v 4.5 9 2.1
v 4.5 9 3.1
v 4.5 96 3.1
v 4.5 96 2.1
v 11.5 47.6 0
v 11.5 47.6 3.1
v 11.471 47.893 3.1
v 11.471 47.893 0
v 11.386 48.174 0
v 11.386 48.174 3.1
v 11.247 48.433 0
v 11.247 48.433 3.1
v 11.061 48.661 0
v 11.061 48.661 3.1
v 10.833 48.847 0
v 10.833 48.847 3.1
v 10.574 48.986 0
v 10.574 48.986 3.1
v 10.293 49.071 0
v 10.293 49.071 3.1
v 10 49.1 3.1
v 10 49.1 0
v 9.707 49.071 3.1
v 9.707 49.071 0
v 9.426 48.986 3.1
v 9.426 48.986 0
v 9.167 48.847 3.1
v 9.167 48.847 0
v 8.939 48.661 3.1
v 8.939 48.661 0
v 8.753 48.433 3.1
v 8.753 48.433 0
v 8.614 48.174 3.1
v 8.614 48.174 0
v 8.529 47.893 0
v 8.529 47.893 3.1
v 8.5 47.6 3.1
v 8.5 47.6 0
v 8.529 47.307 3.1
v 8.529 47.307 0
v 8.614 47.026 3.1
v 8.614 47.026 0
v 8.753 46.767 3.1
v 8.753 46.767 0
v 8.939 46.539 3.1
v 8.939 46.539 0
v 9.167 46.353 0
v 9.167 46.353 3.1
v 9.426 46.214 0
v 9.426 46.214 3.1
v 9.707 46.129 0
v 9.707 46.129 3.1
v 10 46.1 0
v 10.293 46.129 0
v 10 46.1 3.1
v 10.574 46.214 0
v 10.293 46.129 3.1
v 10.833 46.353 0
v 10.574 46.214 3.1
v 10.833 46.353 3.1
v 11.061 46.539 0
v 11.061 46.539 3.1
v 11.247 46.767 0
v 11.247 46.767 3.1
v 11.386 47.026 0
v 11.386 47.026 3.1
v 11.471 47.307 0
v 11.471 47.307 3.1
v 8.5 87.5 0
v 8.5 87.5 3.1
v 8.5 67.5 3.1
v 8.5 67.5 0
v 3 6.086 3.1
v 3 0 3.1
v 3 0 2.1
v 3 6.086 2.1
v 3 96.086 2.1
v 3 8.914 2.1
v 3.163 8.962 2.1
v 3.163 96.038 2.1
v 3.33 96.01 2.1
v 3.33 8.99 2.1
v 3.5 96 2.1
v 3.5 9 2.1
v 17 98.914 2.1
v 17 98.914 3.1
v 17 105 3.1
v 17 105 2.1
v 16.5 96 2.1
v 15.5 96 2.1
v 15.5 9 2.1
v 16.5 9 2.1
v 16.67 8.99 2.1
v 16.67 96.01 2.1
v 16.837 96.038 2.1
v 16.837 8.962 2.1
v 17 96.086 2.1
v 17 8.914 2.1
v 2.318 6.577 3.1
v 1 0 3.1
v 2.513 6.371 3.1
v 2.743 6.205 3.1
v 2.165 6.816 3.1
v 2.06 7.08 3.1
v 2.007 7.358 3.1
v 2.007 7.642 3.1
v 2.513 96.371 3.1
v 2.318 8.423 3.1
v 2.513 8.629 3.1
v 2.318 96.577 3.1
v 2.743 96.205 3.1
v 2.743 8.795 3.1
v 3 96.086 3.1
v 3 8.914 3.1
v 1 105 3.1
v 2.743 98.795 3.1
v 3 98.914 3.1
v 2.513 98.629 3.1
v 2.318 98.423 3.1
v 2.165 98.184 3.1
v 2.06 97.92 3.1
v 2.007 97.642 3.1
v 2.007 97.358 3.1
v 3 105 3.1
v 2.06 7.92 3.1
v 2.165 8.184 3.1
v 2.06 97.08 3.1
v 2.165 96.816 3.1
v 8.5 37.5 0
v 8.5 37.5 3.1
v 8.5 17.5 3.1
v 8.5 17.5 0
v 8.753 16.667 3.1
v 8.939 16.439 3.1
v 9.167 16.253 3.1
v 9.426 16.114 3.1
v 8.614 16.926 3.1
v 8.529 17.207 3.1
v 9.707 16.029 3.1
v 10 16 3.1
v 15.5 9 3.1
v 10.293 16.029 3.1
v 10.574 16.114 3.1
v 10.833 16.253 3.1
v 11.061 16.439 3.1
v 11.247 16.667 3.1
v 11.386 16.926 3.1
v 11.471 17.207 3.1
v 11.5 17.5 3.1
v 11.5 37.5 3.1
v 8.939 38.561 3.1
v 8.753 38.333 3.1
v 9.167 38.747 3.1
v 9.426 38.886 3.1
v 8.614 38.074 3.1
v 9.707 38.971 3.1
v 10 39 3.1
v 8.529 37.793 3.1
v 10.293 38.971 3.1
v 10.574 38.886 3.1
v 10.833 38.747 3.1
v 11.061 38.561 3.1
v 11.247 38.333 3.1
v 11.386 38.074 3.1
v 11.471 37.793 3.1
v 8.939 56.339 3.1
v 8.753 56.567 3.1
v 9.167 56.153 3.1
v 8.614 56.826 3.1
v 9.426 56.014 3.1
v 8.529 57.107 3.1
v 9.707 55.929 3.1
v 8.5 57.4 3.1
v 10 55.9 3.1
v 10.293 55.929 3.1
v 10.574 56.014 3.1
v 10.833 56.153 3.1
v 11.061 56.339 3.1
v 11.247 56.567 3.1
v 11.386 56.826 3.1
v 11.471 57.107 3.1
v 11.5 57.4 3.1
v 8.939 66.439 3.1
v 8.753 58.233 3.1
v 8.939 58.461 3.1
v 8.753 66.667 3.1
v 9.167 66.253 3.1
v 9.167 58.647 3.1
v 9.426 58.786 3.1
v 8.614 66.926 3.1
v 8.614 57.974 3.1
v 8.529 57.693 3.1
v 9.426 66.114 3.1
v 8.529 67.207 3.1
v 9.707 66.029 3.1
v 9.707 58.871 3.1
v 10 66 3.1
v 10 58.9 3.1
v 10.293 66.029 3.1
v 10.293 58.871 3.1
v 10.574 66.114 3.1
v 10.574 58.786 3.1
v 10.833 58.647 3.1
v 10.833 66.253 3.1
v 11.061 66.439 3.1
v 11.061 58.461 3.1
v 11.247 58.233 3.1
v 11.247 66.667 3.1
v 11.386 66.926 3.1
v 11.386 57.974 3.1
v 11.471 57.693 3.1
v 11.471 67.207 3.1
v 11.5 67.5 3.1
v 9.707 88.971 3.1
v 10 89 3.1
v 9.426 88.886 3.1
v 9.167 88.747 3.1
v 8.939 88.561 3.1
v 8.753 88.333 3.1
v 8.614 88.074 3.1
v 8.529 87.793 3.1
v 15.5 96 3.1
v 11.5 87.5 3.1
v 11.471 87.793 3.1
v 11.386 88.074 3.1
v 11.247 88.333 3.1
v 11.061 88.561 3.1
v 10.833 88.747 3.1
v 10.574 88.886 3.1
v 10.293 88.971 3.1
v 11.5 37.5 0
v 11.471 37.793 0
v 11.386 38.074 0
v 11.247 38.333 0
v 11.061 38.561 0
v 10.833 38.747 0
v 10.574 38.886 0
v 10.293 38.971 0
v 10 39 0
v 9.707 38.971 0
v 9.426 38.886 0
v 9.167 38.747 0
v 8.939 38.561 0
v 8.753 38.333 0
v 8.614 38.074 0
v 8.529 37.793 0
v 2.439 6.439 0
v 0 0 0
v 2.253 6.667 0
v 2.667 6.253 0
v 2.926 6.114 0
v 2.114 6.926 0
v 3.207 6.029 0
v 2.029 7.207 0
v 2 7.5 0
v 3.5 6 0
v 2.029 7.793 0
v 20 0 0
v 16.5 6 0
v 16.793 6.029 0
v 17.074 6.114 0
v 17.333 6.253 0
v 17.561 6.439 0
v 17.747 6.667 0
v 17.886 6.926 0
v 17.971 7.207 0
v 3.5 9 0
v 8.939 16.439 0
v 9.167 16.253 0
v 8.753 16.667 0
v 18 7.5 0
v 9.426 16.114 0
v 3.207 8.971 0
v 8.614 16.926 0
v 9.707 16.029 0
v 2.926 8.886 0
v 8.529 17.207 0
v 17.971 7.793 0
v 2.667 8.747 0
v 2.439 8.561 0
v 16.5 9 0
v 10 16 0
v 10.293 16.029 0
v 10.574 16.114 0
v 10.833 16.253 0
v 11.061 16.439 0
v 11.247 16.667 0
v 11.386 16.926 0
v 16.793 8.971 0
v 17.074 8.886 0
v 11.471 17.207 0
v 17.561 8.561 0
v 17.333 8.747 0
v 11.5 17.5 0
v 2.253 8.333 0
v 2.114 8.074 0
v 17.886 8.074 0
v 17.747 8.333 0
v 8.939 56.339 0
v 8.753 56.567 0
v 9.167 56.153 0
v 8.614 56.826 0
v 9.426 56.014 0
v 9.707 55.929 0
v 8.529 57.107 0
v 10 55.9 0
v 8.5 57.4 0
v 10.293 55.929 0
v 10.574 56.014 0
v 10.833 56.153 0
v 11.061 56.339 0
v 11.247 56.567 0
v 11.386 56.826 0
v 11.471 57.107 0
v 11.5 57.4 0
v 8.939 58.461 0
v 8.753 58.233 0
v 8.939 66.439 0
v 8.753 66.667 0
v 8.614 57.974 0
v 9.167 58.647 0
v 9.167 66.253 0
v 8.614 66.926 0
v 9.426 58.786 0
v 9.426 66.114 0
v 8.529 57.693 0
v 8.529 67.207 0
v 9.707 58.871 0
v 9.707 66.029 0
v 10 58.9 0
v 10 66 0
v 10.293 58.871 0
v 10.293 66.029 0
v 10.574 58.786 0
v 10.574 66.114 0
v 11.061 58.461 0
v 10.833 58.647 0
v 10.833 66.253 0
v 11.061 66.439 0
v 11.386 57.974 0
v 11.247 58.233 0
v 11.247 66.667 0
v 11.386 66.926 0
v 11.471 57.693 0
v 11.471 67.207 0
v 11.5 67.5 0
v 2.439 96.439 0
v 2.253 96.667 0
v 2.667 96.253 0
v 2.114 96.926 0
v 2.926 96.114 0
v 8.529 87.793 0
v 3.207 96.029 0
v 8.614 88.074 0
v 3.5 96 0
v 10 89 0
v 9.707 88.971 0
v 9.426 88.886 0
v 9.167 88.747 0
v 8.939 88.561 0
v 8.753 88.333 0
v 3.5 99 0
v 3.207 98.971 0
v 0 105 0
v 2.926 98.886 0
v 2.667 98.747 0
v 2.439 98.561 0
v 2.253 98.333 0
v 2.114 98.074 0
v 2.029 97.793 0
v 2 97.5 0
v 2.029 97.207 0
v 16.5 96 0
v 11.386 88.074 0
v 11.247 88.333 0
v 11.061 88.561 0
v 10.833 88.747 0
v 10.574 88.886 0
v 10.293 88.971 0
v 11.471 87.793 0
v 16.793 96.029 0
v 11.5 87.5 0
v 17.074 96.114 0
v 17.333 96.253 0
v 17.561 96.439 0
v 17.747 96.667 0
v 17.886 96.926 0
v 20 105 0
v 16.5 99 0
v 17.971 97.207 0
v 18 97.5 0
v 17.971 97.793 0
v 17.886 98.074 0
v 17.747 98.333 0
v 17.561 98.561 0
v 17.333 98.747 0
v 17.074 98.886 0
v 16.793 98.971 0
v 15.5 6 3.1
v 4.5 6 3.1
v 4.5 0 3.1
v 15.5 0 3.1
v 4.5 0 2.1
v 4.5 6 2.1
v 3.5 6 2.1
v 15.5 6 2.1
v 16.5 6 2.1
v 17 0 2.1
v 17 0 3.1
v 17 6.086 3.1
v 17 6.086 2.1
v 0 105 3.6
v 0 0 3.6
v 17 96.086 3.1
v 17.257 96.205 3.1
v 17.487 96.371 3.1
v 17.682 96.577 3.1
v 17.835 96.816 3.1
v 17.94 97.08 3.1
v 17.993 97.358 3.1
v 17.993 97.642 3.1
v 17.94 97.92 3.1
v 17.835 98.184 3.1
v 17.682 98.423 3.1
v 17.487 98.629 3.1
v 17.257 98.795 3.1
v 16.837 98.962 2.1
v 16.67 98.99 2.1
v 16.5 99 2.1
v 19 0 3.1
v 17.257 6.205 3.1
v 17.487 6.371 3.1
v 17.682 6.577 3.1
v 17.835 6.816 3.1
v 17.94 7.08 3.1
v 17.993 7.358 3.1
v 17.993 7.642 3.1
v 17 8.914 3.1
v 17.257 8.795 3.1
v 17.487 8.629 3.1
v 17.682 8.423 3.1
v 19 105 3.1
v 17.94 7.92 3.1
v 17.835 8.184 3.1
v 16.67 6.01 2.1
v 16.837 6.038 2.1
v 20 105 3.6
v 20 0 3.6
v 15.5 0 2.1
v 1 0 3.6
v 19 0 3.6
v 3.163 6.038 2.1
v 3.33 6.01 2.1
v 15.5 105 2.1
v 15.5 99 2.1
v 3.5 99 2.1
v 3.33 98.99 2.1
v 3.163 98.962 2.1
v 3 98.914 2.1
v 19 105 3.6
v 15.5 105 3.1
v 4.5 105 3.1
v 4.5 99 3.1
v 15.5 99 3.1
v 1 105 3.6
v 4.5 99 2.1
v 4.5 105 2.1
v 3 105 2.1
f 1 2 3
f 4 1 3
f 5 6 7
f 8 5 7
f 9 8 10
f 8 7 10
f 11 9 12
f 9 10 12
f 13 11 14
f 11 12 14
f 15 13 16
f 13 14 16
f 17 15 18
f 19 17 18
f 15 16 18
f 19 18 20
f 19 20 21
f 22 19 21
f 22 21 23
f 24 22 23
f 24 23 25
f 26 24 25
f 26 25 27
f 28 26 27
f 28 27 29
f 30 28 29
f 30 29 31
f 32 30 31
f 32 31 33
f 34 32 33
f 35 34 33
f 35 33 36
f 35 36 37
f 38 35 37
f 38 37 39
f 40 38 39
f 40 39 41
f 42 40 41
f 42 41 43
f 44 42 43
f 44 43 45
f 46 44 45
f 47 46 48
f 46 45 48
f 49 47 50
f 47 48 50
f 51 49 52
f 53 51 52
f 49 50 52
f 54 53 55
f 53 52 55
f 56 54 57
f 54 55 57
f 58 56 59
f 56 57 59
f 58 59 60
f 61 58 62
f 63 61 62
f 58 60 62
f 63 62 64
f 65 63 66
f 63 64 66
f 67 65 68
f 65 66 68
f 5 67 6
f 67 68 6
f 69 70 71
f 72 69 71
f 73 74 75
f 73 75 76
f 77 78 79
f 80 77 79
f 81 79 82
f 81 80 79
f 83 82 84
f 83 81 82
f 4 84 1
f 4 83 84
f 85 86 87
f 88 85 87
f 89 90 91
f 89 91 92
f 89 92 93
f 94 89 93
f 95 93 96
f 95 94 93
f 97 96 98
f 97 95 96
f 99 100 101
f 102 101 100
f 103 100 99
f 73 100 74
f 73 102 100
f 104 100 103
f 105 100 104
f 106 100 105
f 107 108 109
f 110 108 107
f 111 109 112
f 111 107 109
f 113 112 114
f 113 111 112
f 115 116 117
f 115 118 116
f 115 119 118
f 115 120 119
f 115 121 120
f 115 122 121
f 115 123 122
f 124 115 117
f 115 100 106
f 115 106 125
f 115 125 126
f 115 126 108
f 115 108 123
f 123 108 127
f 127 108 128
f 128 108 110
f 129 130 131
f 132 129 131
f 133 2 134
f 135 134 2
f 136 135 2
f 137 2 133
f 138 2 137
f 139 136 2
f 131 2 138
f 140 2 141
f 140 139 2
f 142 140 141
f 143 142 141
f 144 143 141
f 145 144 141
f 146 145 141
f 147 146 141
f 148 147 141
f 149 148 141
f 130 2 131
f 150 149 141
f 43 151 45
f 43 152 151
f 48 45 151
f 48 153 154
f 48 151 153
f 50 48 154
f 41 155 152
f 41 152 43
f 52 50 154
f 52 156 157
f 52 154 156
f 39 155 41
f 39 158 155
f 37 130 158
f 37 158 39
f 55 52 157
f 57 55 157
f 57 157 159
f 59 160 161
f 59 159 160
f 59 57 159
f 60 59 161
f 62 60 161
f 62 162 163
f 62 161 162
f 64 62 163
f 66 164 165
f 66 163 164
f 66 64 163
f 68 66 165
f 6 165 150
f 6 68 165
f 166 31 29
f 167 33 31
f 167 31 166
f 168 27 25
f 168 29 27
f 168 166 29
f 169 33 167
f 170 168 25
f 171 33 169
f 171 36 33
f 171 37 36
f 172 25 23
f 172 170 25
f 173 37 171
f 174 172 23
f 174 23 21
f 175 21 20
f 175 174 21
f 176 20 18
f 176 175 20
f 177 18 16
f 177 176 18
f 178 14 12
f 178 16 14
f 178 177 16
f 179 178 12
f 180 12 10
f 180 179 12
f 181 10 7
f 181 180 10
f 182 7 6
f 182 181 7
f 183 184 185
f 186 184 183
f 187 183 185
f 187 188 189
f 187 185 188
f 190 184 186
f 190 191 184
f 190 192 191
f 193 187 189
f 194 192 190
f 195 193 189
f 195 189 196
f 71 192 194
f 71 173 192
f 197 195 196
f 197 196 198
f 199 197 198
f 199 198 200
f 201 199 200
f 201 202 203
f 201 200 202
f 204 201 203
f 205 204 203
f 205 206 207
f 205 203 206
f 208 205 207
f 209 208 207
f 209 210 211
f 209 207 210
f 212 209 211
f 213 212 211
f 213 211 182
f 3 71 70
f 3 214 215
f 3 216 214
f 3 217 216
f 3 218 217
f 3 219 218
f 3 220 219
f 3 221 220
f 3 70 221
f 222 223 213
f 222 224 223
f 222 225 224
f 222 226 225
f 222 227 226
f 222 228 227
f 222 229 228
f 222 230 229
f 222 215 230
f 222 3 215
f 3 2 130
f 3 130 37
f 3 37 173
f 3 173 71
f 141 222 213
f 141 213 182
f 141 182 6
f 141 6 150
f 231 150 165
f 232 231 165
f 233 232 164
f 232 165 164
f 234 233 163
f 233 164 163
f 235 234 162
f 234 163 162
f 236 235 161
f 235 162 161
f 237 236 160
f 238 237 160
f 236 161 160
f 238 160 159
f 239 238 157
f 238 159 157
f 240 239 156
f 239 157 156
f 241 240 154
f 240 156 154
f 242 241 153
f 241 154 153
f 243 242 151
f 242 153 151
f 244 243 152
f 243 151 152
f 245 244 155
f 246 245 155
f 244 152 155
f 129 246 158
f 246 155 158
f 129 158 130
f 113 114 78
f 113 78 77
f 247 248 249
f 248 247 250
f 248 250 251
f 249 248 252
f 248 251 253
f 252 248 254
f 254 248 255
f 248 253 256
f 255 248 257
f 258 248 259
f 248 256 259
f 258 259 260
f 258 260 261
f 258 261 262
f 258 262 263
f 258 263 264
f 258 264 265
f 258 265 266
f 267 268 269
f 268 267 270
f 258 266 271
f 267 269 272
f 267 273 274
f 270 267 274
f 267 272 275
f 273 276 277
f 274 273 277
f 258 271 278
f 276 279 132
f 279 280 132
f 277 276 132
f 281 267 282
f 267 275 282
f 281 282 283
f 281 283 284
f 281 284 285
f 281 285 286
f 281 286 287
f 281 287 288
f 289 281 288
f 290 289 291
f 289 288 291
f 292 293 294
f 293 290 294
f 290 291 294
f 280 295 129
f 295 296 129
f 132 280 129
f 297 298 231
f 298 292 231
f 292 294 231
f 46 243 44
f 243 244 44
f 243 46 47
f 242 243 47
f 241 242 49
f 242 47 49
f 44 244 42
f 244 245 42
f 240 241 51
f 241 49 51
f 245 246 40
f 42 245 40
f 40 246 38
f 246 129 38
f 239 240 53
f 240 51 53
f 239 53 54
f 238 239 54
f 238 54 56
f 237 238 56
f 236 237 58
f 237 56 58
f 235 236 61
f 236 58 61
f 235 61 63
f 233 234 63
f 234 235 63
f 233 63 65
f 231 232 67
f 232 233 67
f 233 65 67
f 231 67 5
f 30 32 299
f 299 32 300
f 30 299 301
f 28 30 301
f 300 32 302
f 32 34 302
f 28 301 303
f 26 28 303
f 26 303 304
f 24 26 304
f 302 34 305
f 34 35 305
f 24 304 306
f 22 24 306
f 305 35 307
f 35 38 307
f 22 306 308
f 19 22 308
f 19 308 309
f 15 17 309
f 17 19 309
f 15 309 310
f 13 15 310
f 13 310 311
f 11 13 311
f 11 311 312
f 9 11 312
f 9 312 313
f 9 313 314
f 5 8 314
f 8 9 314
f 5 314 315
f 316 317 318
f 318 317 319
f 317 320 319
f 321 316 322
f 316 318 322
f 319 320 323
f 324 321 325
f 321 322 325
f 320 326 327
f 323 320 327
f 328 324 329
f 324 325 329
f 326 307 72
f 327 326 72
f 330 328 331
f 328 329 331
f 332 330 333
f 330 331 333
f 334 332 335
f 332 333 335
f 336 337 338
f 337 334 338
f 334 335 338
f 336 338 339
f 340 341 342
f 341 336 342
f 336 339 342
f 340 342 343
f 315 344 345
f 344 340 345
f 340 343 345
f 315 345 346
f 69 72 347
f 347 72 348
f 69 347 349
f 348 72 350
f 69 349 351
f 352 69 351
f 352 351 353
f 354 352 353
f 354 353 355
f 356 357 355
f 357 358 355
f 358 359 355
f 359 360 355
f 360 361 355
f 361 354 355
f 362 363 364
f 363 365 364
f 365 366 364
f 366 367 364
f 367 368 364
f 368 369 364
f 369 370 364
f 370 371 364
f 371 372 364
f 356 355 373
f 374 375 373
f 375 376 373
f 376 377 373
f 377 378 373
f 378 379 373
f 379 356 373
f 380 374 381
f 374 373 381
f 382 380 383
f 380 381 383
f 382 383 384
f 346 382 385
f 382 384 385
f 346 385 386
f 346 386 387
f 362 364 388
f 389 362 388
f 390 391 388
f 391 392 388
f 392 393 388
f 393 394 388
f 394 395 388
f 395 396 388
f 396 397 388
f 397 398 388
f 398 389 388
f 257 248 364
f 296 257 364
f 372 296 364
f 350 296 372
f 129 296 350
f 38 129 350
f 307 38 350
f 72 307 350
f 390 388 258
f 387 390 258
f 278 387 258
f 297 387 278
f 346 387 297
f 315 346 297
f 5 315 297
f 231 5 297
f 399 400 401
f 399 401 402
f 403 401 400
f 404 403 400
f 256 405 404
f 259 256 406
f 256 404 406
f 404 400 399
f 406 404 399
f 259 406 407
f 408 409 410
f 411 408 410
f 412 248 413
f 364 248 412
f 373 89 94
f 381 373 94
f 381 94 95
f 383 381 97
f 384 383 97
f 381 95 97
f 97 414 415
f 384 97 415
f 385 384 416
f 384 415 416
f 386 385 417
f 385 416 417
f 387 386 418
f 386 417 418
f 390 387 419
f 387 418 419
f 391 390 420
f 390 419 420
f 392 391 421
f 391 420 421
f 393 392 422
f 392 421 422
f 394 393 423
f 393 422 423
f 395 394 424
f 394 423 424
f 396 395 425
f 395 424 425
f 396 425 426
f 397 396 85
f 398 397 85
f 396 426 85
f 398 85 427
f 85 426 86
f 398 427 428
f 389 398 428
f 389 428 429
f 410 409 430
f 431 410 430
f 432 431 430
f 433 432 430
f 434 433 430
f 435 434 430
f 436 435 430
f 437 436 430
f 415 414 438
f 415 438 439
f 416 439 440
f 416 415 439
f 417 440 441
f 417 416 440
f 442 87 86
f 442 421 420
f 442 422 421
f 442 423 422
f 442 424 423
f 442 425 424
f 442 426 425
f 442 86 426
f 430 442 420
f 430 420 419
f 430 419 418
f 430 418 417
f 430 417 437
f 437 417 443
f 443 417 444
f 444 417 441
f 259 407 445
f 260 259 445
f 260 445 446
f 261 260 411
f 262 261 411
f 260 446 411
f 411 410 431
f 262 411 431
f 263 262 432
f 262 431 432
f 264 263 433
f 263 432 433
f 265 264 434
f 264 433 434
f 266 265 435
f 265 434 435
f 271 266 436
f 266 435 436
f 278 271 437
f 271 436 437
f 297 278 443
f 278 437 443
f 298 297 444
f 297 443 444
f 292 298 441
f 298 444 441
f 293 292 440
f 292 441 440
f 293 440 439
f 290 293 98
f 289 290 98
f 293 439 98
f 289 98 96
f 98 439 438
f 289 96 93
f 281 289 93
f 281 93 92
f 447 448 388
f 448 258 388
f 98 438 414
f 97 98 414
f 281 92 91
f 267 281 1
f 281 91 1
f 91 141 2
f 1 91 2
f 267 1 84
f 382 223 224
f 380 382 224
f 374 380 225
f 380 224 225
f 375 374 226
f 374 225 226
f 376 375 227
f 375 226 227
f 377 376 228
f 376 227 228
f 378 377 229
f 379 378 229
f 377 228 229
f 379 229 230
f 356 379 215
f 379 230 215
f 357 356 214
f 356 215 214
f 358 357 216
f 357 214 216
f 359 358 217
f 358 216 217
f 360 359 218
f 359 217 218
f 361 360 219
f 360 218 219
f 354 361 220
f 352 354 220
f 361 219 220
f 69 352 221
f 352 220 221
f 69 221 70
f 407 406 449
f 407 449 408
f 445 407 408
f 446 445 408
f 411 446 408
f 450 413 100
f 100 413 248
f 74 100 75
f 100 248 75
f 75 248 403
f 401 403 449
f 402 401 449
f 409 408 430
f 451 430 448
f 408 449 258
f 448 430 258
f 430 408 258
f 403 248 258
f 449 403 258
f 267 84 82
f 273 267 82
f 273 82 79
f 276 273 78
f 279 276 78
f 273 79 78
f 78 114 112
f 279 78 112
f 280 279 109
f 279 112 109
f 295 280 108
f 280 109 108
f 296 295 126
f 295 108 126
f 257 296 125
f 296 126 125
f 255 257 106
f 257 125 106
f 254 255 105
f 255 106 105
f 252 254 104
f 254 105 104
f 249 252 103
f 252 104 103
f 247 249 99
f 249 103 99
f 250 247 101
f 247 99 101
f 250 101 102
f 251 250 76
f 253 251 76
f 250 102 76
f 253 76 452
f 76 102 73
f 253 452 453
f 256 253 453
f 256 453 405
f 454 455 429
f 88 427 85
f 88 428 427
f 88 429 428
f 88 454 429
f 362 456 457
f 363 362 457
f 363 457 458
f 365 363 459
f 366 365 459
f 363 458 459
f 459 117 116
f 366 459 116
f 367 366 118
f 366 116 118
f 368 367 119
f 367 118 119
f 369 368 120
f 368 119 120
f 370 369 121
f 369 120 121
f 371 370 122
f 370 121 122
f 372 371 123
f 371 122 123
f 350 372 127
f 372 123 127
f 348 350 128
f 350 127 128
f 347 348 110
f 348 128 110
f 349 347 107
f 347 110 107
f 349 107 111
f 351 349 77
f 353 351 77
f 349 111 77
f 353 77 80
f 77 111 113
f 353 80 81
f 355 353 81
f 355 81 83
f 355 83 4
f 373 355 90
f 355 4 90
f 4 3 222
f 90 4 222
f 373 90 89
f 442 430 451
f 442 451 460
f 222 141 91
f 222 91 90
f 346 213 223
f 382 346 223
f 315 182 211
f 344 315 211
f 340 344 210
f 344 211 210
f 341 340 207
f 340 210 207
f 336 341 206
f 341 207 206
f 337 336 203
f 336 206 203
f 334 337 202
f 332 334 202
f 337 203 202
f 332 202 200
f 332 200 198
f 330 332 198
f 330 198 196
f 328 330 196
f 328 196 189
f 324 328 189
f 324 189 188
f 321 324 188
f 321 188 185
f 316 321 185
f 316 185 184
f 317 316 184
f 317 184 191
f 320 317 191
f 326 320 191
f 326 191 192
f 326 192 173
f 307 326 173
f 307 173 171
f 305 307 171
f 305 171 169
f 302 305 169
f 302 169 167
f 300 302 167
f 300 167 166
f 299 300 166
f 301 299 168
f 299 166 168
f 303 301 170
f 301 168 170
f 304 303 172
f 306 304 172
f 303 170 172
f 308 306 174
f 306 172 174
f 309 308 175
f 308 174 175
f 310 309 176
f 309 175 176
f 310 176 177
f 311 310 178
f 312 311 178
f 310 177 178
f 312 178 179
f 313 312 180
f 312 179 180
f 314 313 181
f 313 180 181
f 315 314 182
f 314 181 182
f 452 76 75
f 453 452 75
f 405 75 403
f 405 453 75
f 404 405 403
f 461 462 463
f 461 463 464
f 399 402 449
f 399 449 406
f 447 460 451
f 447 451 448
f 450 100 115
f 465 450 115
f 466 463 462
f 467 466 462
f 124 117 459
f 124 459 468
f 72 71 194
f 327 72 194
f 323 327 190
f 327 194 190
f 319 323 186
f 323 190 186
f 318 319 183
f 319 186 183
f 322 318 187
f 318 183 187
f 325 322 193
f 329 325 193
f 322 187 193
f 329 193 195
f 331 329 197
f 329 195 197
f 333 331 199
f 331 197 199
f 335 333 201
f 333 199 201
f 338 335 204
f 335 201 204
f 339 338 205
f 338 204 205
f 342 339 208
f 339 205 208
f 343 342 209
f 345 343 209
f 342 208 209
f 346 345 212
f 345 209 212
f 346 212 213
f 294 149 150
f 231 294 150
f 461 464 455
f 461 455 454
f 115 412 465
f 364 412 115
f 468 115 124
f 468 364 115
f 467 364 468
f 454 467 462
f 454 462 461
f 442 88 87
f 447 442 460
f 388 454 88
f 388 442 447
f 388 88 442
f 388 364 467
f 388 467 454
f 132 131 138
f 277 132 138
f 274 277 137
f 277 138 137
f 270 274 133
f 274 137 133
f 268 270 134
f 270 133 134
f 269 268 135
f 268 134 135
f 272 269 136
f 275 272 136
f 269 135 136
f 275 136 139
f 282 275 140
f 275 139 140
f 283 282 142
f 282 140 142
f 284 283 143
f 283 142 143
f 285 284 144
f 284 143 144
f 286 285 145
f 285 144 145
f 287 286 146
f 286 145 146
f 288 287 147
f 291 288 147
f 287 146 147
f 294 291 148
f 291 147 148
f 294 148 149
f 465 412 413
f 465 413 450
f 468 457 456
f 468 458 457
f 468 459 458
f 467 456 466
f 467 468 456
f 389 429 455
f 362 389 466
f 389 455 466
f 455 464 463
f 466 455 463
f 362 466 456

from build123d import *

# Parameters (mm, degrees)
F0_W     = 20
F0_H     = 105
F1_DEPTH = 3.1
F2_W     = 1
F2_H     = 105
F3_DEPTH = 0.5
F4_R     = 1.5
F5_DEPTH = 3.101
F6_W     = 1.5
F6_H     = 105
F7_DEPTH = 1


with BuildPart() as f1:
    # F0 (on Top) → F1 (new body)
    with BuildSketch(Plane.XY):
        with Locations((10, 52.5)):
            Rectangle(F0_W, F0_H)
    extrude(amount=F1_DEPTH)

    # F2 (on face) → F3 (join)
    with BuildSketch(Plane.XY.offset(3.1)):
        with Locations((19.5, 52.5)):
            Rectangle(F2_W, F2_H)
        with Locations((0.5, 52.5)):
            Rectangle(F2_W, F2_H)
    extrude(amount=F3_DEPTH)

    # F4 (on face) → F5 (cut, through all)
    with BuildSketch(Plane.XY.offset(3.1)):
        with BuildLine():
            Line((16.5, 9), (3.5, 9))
            ThreePointArc((3.5, 9), (2, 7.5), (3.5, 6))
            Line((3.5, 6), (16.5, 6))
            ThreePointArc((16.5, 6), (18, 7.5), (16.5, 9))
        make_face()
        with BuildLine():
            Line((8.5, 37.5), (8.5, 17.5))
            ThreePointArc((8.5, 17.5), (10, 16), (11.5, 17.5))
            Line((11.5, 17.5), (11.5, 37.5))
            ThreePointArc((11.5, 37.5), (10, 39), (8.5, 37.5))
        make_face()
        with Locations((10, 47.6)):
            Circle(F4_R)
        with BuildLine():
            Line((16.5, 99), (3.5, 99))
            ThreePointArc((3.5, 99), (2, 97.5), (3.5, 96))
            Line((3.5, 96), (16.5, 96))
            ThreePointArc((16.5, 96), (18, 97.5), (16.5, 99))
        make_face()
        with BuildLine():
            Line((11.5, 67.5), (11.5, 87.5))
            ThreePointArc((11.5, 87.5), (10, 89), (8.5, 87.5))
            Line((8.5, 87.5), (8.5, 67.5))
            ThreePointArc((8.5, 67.5), (10, 66), (11.5, 67.5))
        make_face()
        with Locations((10, 57.4)):
            Circle(F4_R)
    extrude(amount=-F5_DEPTH, mode=Mode.SUBTRACT)

    # F6 (on face) → F7 (cut)
    with BuildSketch(Plane.XY.offset(3.1)):
        with Locations((3.75, 52.5)):
            Rectangle(F6_W, F6_H)
        with Locations((16.25, 52.5)):
            Rectangle(F6_W, F6_H)
    extrude(amount=-F7_DEPTH, mode=Mode.SUBTRACT)


solid = f1.part
